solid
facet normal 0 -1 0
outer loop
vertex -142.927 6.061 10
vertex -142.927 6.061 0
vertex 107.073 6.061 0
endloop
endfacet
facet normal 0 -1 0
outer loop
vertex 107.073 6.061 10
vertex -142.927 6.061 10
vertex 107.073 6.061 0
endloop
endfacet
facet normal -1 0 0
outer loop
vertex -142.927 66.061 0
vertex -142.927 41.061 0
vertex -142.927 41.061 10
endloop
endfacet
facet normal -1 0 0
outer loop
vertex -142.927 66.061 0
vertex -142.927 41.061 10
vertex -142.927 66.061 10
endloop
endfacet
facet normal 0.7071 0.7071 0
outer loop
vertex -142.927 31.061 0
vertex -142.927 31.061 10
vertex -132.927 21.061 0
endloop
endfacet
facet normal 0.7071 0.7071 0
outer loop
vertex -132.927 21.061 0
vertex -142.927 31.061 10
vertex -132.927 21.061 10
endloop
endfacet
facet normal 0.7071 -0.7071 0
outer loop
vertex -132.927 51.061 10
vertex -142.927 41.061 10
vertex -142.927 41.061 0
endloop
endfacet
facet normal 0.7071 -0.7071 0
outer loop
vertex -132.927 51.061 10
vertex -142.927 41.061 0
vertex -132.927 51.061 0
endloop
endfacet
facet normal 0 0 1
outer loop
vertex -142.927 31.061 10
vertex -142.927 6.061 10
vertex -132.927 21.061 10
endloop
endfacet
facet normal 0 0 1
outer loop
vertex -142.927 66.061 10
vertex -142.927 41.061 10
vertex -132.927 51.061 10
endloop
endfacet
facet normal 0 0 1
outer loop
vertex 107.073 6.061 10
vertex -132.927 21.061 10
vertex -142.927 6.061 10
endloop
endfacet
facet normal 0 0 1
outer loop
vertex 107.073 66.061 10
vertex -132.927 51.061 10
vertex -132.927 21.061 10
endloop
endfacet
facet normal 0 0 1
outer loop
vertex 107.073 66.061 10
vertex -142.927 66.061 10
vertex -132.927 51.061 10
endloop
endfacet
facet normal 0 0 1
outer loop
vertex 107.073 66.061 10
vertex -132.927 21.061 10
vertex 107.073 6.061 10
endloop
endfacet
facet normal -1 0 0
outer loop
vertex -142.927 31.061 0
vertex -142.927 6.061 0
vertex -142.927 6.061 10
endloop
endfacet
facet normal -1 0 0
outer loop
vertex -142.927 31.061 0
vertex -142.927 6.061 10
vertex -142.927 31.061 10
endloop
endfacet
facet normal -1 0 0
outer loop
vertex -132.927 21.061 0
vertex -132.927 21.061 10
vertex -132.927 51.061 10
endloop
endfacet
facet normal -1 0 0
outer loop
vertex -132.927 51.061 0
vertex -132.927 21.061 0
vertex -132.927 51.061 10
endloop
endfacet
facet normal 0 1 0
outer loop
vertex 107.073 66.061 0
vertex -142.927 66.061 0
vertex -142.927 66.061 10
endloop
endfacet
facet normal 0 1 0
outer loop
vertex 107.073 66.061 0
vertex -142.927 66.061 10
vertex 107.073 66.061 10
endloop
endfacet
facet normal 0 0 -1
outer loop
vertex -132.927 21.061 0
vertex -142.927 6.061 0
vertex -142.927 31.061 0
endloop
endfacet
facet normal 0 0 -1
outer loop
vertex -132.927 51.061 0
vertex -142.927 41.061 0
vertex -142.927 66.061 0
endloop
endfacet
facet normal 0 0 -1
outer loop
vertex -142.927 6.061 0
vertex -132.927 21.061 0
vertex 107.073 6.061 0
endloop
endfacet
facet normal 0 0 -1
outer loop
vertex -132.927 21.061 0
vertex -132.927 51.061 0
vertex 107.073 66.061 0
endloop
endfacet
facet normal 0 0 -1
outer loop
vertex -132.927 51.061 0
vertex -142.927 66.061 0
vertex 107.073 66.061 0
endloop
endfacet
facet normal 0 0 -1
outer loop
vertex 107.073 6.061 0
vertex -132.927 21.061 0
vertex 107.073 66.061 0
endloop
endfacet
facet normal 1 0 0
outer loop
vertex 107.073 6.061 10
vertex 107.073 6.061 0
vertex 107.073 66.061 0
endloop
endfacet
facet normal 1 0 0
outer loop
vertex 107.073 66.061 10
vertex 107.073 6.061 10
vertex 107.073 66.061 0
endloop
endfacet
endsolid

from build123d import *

# Parameters (mm, degrees)
SKETCH_1_W          = 250
SKETCH_1_H          = 60
EXTRUDE_1_DEPTH     = 10
SKETCH_8_W          = 10
SKETCH_8_H          = 10
CUT_EXTRUDE_3_DEPTH = 10
CUT_EXTRUDE_4_DEPTH = 10
CUT_EXTRUDE_5_DEPTH = 10


with BuildPart() as part:
    # 草图1 → 凸台-拉伸1 (new body)
    with BuildSketch(Plane.XY):
        with Locations((-17.927308448, 36.060903733)):
            Rectangle(SKETCH_1_W, SKETCH_1_H)
    extrude(amount=EXTRUDE_1_DEPTH)

    # 草图8 → 切除-拉伸3 (cut)
    with BuildSketch(Plane.ZY.offset(142.927308448)):
        with Locations((5, 36.060903733)):
            Rectangle(SKETCH_8_W, SKETCH_8_H)
    extrude(amount=-CUT_EXTRUDE_3_DEPTH, mode=Mode.SUBTRACT)

    # 草图9 → 切除-拉伸4 (cut)
    with BuildSketch(Plane.XY.offset(10)):
        Polygon((-142.927308448, 41.060903733), (-132.927308448, 51.060903733), (-132.927308448, 41.060903733), align=None)
    extrude(amount=-CUT_EXTRUDE_4_DEPTH, mode=Mode.SUBTRACT)

    # 草图10 → 切除-拉伸5 (cut)
    with BuildSketch(Plane.XY.offset(10)):
        Polygon((-142.927308448, 31.060903733), (-132.927308448, 21.060903733), (-132.927308448, 31.060903733), align=None)
    extrude(amount=-CUT_EXTRUDE_5_DEPTH, mode=Mode.SUBTRACT)


solid = part.part
